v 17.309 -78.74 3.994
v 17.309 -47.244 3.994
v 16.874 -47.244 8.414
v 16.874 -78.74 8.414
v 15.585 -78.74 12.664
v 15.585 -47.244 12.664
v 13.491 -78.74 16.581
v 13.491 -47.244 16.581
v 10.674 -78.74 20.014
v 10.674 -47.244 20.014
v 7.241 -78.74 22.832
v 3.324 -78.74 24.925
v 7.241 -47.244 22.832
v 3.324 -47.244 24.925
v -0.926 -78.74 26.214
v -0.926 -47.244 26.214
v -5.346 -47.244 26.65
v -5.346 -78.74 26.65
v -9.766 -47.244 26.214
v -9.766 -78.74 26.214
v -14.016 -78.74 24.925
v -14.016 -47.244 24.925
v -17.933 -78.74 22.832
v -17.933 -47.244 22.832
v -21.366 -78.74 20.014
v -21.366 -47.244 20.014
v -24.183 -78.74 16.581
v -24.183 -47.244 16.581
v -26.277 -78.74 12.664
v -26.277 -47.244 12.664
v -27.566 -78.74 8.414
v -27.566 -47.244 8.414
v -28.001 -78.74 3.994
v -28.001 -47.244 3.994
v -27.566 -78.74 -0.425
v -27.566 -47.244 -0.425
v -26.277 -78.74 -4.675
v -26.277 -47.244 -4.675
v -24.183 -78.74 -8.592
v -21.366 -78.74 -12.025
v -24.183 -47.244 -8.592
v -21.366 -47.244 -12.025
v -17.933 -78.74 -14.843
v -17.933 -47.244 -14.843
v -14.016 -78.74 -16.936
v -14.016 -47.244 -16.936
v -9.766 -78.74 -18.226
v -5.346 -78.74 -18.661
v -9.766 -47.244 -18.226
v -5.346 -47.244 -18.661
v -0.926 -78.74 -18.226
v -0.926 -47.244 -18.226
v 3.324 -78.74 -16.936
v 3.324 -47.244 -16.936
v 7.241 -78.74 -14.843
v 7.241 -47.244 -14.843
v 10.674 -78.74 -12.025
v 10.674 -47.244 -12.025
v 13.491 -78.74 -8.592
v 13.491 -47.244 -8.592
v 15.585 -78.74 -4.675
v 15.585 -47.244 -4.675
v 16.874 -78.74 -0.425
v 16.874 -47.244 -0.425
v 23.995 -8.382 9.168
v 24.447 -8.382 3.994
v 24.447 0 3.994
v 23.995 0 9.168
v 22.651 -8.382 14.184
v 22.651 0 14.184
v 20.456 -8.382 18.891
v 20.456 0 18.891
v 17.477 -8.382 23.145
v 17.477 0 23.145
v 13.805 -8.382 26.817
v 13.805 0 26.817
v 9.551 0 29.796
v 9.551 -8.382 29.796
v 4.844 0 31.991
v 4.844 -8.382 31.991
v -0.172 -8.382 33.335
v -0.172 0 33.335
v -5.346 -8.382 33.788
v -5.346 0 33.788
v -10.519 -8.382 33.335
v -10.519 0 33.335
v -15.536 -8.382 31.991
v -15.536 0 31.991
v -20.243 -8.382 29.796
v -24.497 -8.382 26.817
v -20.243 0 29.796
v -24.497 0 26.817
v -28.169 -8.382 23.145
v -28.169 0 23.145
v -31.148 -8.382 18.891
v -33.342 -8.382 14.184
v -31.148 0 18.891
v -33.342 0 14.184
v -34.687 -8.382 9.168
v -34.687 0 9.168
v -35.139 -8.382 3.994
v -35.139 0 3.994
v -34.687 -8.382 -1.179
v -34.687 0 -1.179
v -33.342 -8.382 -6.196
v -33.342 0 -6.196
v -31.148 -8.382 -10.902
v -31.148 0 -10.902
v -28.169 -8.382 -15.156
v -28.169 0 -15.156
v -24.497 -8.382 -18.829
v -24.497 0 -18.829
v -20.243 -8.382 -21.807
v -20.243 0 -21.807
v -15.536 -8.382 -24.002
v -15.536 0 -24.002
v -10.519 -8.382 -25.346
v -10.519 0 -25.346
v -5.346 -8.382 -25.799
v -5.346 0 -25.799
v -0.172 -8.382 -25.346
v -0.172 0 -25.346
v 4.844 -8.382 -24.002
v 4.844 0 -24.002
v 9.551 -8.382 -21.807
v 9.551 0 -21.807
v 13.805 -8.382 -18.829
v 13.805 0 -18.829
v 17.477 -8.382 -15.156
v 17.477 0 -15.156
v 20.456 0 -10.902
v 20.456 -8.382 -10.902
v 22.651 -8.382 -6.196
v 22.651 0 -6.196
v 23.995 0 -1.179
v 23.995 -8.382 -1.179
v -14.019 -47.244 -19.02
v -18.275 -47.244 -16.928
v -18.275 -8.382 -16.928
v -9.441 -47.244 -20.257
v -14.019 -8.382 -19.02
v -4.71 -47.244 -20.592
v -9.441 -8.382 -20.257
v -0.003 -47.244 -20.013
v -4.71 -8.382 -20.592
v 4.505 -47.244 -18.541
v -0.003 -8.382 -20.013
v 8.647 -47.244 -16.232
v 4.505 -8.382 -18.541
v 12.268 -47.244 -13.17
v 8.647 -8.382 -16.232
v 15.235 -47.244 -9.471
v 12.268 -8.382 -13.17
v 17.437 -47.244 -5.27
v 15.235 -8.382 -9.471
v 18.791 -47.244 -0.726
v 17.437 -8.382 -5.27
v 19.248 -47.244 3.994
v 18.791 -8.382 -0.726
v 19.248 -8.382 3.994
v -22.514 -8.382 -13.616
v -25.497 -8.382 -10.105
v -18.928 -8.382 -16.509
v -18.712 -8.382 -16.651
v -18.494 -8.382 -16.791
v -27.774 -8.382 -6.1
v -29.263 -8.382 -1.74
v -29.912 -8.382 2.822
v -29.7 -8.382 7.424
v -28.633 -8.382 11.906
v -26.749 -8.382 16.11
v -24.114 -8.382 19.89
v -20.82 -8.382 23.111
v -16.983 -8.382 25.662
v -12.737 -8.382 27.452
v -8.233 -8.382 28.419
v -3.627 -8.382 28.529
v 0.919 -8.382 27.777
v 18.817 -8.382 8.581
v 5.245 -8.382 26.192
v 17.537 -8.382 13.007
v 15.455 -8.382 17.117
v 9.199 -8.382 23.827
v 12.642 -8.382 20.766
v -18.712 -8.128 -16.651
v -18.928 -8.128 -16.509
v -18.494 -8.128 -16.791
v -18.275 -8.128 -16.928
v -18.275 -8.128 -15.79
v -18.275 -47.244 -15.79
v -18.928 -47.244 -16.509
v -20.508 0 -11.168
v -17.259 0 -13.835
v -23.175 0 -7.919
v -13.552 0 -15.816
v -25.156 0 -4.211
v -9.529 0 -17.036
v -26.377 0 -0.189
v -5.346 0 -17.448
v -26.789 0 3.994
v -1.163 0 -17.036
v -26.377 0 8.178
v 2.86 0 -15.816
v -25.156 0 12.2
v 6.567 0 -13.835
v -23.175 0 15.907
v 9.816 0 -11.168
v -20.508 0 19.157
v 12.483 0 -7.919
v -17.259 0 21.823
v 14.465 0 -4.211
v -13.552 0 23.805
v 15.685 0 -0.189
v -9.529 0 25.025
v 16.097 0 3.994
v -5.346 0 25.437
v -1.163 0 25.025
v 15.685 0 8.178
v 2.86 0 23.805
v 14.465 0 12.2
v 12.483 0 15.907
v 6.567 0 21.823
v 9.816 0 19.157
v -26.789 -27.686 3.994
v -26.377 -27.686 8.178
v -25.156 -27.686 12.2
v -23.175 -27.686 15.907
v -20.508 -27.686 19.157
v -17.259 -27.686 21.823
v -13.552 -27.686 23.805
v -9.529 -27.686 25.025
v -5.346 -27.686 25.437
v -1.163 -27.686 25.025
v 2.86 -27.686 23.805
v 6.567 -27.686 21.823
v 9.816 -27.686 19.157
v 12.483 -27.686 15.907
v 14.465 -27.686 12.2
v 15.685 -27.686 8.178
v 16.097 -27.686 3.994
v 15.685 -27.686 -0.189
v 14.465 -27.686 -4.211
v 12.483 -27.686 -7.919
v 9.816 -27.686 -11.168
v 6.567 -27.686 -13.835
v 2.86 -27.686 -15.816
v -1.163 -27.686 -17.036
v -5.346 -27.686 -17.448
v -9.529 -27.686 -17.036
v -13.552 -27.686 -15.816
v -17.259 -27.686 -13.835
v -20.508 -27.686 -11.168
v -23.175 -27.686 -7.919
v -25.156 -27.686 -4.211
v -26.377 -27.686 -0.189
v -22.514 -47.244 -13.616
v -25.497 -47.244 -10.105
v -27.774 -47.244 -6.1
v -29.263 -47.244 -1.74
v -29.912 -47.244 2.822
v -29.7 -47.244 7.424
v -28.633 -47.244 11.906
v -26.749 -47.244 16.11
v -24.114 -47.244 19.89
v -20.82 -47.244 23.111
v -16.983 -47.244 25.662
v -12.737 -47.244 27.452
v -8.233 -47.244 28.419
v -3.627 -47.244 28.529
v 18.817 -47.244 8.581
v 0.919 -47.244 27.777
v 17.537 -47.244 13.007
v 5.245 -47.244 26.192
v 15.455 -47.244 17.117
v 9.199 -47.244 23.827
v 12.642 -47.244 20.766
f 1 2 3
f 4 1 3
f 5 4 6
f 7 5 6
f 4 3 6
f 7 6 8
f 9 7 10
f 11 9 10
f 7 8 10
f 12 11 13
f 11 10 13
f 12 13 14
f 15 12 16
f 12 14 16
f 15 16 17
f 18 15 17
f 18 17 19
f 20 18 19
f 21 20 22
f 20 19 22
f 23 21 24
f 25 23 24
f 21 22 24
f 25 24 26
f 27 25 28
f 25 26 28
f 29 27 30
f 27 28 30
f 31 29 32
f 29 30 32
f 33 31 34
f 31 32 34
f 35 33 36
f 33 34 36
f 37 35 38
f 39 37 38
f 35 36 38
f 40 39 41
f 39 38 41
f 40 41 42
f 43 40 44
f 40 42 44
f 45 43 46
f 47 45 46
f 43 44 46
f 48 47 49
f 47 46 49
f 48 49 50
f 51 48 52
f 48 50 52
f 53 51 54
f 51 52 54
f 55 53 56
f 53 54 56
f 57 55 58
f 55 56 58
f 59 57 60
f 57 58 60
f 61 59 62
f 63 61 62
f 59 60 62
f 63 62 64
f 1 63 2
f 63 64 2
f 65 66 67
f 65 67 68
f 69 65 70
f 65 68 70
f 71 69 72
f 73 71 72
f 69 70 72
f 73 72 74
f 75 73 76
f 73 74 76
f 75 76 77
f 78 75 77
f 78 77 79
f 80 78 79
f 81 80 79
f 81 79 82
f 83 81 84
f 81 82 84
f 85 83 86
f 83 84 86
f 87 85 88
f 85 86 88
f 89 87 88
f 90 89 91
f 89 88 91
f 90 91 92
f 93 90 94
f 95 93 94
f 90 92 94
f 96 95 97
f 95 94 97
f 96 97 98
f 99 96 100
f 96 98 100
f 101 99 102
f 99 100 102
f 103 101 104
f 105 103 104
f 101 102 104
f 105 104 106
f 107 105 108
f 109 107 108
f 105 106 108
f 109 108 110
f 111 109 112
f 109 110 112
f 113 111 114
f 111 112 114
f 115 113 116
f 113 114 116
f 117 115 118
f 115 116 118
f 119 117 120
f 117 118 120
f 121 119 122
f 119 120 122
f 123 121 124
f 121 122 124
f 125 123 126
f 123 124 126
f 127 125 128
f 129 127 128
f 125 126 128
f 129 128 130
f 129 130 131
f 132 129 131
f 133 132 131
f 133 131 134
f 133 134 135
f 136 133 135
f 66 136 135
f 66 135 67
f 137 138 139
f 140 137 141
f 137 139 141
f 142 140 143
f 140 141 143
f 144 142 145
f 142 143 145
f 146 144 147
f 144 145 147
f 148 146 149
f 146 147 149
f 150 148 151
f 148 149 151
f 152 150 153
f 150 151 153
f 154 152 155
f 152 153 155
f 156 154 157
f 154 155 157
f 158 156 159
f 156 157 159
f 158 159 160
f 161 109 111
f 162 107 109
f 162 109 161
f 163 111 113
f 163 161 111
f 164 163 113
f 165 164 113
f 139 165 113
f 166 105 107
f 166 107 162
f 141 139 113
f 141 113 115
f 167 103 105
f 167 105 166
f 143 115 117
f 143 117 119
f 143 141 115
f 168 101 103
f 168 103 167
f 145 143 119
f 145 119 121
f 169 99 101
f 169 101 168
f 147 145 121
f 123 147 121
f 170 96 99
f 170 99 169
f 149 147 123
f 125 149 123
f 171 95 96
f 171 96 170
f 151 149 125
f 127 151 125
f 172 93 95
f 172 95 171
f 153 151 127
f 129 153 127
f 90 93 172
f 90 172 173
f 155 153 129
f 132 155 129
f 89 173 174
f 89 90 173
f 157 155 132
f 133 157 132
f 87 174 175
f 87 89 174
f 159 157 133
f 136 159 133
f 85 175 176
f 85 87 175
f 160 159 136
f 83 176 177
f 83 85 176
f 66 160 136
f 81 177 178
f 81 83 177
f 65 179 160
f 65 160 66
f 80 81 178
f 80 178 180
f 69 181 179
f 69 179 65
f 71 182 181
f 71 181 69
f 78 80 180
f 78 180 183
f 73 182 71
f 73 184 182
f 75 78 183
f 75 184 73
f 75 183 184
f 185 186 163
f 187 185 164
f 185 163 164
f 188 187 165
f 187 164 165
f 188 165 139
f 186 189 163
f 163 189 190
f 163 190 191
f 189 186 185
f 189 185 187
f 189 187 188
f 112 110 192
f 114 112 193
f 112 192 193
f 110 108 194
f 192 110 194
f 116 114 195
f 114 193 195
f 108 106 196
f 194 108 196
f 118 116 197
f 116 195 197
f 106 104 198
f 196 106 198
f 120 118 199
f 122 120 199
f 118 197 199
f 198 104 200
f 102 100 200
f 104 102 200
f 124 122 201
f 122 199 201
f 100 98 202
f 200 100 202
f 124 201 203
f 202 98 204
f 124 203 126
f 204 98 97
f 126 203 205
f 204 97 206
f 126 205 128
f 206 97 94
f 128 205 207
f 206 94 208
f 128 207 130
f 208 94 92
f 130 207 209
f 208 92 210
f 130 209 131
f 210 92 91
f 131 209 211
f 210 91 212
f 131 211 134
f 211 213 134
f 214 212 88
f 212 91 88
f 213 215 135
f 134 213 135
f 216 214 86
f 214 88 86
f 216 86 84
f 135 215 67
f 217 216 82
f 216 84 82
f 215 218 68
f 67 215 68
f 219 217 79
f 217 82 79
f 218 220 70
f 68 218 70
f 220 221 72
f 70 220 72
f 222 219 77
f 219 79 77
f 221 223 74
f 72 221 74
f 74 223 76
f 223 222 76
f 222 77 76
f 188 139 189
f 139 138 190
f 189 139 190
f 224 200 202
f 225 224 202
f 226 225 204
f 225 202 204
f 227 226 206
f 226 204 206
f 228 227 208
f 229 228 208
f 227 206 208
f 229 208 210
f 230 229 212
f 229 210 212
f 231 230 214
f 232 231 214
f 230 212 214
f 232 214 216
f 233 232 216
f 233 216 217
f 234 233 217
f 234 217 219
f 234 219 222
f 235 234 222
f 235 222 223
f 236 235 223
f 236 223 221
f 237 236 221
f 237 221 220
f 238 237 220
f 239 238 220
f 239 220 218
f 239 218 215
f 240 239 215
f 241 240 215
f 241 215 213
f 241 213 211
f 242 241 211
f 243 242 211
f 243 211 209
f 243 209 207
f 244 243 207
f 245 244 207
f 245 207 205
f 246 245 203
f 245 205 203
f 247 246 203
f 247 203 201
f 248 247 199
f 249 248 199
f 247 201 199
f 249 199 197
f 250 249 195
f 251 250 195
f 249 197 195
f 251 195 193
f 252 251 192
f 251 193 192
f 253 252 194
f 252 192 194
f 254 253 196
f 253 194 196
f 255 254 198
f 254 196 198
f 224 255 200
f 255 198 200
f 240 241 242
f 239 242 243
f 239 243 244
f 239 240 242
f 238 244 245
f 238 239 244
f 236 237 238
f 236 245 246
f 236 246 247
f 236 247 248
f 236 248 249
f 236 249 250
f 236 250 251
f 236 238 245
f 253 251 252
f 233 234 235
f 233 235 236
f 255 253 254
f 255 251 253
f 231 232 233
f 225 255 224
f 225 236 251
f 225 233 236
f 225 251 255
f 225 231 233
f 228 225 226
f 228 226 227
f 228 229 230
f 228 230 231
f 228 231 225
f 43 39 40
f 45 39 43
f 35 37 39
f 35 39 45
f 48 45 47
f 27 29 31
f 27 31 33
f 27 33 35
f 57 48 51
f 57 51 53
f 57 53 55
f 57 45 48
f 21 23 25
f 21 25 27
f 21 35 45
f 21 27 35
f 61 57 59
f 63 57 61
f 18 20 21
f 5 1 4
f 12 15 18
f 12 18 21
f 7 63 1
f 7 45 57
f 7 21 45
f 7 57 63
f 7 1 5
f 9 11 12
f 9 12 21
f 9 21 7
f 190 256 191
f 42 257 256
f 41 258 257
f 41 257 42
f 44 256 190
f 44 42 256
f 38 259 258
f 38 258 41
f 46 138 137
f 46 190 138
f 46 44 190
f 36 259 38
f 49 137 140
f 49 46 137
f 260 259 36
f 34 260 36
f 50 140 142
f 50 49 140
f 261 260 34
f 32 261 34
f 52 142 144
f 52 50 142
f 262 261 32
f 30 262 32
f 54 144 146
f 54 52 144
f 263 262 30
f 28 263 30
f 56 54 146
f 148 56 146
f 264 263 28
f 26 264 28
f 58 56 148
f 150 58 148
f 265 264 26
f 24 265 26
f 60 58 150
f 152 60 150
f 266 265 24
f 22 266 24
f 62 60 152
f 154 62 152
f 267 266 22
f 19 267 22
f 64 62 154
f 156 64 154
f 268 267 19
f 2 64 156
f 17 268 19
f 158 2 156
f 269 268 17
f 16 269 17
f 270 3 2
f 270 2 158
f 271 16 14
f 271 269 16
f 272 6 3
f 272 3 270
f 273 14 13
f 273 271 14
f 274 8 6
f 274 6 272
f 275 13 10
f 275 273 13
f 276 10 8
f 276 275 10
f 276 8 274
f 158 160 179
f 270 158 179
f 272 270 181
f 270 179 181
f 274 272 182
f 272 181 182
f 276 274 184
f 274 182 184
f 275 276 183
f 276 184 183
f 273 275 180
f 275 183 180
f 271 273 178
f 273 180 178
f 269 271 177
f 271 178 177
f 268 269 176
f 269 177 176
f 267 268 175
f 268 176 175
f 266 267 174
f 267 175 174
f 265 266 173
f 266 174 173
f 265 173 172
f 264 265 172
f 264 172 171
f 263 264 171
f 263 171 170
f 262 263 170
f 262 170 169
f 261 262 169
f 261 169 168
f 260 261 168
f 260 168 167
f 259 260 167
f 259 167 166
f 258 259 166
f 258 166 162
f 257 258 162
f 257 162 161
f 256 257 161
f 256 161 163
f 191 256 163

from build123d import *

# Parameters (mm, degrees)
F0_R      = 29.7932126591
F1_DEPTH  = 8.382
F2_R      = 24.5943618738
F3_DEPTH  = 38.862
F4_R      = 22.6553491942
F5_DEPTH  = 31.496
F7_DEPTH  = 39.116
F8_R      = 21.4427670818
F9_DEPTH  = 2.286
F10_DEPTH = 25.4


with BuildPart() as f1:
    # F0 (on Front) → F1 (new body)
    with BuildSketch(Plane.XZ):
        with Locations((-5.3459531628, 3.9943419397)):
            Circle(F0_R)
    extrude(amount=F1_DEPTH)

    # F2 (on face) → F3 (join)
    with BuildSketch(Plane.XZ.offset(8.382)):
        with Locations((-5.3459531628, 3.9943419397)):
            Circle(F2_R)
    extrude(amount=F3_DEPTH)

    # F4 (on face) → F5 (join)
    with BuildSketch(Plane.XZ.offset(47.244)):
        with Locations((-5.3459531628, 3.9943419397)):
            Circle(F4_R)
    extrude(amount=F5_DEPTH)

    # F6 (on face) → F7 (cut)
    with BuildSketch(Plane.XZ.offset(47.244)):
        with BuildLine():
            Line((-18.2745195925, -16.927770909), (-18.2745195925, -15.7896652818))
            Line((-18.2745195925, -15.7896652818), (-18.9284321236, -16.5092894767))
            ThreePointArc((-18.9284321236, -16.5092894767), (-18.6031272056, -16.7211105627), (-18.2745195925, -16.927770909))
        make_face()
    extrude(amount=-F7_DEPTH, mode=Mode.SUBTRACT)

    # F8 (on face) → F9 (cut)
    with BuildSketch(Plane(origin=(0, 0, 0), x_dir=(-1, 0, 0), z_dir=(0, 1, 0))):
        with Locations((5.3459531628, 3.9943419397)):
            Circle(F8_R)
    extrude(amount=-F9_DEPTH, mode=Mode.SUBTRACT)

    # F10 (cut): a face of the model
    f10_faces = [f1.faces().sort_by_distance(p)[0] for p in [
        (-5.3459531628, -2.286, 3.9943419397),
    ]]
    extrude(f10_faces, amount=-F10_DEPTH, mode=Mode.SUBTRACT)


solid = f1.part
